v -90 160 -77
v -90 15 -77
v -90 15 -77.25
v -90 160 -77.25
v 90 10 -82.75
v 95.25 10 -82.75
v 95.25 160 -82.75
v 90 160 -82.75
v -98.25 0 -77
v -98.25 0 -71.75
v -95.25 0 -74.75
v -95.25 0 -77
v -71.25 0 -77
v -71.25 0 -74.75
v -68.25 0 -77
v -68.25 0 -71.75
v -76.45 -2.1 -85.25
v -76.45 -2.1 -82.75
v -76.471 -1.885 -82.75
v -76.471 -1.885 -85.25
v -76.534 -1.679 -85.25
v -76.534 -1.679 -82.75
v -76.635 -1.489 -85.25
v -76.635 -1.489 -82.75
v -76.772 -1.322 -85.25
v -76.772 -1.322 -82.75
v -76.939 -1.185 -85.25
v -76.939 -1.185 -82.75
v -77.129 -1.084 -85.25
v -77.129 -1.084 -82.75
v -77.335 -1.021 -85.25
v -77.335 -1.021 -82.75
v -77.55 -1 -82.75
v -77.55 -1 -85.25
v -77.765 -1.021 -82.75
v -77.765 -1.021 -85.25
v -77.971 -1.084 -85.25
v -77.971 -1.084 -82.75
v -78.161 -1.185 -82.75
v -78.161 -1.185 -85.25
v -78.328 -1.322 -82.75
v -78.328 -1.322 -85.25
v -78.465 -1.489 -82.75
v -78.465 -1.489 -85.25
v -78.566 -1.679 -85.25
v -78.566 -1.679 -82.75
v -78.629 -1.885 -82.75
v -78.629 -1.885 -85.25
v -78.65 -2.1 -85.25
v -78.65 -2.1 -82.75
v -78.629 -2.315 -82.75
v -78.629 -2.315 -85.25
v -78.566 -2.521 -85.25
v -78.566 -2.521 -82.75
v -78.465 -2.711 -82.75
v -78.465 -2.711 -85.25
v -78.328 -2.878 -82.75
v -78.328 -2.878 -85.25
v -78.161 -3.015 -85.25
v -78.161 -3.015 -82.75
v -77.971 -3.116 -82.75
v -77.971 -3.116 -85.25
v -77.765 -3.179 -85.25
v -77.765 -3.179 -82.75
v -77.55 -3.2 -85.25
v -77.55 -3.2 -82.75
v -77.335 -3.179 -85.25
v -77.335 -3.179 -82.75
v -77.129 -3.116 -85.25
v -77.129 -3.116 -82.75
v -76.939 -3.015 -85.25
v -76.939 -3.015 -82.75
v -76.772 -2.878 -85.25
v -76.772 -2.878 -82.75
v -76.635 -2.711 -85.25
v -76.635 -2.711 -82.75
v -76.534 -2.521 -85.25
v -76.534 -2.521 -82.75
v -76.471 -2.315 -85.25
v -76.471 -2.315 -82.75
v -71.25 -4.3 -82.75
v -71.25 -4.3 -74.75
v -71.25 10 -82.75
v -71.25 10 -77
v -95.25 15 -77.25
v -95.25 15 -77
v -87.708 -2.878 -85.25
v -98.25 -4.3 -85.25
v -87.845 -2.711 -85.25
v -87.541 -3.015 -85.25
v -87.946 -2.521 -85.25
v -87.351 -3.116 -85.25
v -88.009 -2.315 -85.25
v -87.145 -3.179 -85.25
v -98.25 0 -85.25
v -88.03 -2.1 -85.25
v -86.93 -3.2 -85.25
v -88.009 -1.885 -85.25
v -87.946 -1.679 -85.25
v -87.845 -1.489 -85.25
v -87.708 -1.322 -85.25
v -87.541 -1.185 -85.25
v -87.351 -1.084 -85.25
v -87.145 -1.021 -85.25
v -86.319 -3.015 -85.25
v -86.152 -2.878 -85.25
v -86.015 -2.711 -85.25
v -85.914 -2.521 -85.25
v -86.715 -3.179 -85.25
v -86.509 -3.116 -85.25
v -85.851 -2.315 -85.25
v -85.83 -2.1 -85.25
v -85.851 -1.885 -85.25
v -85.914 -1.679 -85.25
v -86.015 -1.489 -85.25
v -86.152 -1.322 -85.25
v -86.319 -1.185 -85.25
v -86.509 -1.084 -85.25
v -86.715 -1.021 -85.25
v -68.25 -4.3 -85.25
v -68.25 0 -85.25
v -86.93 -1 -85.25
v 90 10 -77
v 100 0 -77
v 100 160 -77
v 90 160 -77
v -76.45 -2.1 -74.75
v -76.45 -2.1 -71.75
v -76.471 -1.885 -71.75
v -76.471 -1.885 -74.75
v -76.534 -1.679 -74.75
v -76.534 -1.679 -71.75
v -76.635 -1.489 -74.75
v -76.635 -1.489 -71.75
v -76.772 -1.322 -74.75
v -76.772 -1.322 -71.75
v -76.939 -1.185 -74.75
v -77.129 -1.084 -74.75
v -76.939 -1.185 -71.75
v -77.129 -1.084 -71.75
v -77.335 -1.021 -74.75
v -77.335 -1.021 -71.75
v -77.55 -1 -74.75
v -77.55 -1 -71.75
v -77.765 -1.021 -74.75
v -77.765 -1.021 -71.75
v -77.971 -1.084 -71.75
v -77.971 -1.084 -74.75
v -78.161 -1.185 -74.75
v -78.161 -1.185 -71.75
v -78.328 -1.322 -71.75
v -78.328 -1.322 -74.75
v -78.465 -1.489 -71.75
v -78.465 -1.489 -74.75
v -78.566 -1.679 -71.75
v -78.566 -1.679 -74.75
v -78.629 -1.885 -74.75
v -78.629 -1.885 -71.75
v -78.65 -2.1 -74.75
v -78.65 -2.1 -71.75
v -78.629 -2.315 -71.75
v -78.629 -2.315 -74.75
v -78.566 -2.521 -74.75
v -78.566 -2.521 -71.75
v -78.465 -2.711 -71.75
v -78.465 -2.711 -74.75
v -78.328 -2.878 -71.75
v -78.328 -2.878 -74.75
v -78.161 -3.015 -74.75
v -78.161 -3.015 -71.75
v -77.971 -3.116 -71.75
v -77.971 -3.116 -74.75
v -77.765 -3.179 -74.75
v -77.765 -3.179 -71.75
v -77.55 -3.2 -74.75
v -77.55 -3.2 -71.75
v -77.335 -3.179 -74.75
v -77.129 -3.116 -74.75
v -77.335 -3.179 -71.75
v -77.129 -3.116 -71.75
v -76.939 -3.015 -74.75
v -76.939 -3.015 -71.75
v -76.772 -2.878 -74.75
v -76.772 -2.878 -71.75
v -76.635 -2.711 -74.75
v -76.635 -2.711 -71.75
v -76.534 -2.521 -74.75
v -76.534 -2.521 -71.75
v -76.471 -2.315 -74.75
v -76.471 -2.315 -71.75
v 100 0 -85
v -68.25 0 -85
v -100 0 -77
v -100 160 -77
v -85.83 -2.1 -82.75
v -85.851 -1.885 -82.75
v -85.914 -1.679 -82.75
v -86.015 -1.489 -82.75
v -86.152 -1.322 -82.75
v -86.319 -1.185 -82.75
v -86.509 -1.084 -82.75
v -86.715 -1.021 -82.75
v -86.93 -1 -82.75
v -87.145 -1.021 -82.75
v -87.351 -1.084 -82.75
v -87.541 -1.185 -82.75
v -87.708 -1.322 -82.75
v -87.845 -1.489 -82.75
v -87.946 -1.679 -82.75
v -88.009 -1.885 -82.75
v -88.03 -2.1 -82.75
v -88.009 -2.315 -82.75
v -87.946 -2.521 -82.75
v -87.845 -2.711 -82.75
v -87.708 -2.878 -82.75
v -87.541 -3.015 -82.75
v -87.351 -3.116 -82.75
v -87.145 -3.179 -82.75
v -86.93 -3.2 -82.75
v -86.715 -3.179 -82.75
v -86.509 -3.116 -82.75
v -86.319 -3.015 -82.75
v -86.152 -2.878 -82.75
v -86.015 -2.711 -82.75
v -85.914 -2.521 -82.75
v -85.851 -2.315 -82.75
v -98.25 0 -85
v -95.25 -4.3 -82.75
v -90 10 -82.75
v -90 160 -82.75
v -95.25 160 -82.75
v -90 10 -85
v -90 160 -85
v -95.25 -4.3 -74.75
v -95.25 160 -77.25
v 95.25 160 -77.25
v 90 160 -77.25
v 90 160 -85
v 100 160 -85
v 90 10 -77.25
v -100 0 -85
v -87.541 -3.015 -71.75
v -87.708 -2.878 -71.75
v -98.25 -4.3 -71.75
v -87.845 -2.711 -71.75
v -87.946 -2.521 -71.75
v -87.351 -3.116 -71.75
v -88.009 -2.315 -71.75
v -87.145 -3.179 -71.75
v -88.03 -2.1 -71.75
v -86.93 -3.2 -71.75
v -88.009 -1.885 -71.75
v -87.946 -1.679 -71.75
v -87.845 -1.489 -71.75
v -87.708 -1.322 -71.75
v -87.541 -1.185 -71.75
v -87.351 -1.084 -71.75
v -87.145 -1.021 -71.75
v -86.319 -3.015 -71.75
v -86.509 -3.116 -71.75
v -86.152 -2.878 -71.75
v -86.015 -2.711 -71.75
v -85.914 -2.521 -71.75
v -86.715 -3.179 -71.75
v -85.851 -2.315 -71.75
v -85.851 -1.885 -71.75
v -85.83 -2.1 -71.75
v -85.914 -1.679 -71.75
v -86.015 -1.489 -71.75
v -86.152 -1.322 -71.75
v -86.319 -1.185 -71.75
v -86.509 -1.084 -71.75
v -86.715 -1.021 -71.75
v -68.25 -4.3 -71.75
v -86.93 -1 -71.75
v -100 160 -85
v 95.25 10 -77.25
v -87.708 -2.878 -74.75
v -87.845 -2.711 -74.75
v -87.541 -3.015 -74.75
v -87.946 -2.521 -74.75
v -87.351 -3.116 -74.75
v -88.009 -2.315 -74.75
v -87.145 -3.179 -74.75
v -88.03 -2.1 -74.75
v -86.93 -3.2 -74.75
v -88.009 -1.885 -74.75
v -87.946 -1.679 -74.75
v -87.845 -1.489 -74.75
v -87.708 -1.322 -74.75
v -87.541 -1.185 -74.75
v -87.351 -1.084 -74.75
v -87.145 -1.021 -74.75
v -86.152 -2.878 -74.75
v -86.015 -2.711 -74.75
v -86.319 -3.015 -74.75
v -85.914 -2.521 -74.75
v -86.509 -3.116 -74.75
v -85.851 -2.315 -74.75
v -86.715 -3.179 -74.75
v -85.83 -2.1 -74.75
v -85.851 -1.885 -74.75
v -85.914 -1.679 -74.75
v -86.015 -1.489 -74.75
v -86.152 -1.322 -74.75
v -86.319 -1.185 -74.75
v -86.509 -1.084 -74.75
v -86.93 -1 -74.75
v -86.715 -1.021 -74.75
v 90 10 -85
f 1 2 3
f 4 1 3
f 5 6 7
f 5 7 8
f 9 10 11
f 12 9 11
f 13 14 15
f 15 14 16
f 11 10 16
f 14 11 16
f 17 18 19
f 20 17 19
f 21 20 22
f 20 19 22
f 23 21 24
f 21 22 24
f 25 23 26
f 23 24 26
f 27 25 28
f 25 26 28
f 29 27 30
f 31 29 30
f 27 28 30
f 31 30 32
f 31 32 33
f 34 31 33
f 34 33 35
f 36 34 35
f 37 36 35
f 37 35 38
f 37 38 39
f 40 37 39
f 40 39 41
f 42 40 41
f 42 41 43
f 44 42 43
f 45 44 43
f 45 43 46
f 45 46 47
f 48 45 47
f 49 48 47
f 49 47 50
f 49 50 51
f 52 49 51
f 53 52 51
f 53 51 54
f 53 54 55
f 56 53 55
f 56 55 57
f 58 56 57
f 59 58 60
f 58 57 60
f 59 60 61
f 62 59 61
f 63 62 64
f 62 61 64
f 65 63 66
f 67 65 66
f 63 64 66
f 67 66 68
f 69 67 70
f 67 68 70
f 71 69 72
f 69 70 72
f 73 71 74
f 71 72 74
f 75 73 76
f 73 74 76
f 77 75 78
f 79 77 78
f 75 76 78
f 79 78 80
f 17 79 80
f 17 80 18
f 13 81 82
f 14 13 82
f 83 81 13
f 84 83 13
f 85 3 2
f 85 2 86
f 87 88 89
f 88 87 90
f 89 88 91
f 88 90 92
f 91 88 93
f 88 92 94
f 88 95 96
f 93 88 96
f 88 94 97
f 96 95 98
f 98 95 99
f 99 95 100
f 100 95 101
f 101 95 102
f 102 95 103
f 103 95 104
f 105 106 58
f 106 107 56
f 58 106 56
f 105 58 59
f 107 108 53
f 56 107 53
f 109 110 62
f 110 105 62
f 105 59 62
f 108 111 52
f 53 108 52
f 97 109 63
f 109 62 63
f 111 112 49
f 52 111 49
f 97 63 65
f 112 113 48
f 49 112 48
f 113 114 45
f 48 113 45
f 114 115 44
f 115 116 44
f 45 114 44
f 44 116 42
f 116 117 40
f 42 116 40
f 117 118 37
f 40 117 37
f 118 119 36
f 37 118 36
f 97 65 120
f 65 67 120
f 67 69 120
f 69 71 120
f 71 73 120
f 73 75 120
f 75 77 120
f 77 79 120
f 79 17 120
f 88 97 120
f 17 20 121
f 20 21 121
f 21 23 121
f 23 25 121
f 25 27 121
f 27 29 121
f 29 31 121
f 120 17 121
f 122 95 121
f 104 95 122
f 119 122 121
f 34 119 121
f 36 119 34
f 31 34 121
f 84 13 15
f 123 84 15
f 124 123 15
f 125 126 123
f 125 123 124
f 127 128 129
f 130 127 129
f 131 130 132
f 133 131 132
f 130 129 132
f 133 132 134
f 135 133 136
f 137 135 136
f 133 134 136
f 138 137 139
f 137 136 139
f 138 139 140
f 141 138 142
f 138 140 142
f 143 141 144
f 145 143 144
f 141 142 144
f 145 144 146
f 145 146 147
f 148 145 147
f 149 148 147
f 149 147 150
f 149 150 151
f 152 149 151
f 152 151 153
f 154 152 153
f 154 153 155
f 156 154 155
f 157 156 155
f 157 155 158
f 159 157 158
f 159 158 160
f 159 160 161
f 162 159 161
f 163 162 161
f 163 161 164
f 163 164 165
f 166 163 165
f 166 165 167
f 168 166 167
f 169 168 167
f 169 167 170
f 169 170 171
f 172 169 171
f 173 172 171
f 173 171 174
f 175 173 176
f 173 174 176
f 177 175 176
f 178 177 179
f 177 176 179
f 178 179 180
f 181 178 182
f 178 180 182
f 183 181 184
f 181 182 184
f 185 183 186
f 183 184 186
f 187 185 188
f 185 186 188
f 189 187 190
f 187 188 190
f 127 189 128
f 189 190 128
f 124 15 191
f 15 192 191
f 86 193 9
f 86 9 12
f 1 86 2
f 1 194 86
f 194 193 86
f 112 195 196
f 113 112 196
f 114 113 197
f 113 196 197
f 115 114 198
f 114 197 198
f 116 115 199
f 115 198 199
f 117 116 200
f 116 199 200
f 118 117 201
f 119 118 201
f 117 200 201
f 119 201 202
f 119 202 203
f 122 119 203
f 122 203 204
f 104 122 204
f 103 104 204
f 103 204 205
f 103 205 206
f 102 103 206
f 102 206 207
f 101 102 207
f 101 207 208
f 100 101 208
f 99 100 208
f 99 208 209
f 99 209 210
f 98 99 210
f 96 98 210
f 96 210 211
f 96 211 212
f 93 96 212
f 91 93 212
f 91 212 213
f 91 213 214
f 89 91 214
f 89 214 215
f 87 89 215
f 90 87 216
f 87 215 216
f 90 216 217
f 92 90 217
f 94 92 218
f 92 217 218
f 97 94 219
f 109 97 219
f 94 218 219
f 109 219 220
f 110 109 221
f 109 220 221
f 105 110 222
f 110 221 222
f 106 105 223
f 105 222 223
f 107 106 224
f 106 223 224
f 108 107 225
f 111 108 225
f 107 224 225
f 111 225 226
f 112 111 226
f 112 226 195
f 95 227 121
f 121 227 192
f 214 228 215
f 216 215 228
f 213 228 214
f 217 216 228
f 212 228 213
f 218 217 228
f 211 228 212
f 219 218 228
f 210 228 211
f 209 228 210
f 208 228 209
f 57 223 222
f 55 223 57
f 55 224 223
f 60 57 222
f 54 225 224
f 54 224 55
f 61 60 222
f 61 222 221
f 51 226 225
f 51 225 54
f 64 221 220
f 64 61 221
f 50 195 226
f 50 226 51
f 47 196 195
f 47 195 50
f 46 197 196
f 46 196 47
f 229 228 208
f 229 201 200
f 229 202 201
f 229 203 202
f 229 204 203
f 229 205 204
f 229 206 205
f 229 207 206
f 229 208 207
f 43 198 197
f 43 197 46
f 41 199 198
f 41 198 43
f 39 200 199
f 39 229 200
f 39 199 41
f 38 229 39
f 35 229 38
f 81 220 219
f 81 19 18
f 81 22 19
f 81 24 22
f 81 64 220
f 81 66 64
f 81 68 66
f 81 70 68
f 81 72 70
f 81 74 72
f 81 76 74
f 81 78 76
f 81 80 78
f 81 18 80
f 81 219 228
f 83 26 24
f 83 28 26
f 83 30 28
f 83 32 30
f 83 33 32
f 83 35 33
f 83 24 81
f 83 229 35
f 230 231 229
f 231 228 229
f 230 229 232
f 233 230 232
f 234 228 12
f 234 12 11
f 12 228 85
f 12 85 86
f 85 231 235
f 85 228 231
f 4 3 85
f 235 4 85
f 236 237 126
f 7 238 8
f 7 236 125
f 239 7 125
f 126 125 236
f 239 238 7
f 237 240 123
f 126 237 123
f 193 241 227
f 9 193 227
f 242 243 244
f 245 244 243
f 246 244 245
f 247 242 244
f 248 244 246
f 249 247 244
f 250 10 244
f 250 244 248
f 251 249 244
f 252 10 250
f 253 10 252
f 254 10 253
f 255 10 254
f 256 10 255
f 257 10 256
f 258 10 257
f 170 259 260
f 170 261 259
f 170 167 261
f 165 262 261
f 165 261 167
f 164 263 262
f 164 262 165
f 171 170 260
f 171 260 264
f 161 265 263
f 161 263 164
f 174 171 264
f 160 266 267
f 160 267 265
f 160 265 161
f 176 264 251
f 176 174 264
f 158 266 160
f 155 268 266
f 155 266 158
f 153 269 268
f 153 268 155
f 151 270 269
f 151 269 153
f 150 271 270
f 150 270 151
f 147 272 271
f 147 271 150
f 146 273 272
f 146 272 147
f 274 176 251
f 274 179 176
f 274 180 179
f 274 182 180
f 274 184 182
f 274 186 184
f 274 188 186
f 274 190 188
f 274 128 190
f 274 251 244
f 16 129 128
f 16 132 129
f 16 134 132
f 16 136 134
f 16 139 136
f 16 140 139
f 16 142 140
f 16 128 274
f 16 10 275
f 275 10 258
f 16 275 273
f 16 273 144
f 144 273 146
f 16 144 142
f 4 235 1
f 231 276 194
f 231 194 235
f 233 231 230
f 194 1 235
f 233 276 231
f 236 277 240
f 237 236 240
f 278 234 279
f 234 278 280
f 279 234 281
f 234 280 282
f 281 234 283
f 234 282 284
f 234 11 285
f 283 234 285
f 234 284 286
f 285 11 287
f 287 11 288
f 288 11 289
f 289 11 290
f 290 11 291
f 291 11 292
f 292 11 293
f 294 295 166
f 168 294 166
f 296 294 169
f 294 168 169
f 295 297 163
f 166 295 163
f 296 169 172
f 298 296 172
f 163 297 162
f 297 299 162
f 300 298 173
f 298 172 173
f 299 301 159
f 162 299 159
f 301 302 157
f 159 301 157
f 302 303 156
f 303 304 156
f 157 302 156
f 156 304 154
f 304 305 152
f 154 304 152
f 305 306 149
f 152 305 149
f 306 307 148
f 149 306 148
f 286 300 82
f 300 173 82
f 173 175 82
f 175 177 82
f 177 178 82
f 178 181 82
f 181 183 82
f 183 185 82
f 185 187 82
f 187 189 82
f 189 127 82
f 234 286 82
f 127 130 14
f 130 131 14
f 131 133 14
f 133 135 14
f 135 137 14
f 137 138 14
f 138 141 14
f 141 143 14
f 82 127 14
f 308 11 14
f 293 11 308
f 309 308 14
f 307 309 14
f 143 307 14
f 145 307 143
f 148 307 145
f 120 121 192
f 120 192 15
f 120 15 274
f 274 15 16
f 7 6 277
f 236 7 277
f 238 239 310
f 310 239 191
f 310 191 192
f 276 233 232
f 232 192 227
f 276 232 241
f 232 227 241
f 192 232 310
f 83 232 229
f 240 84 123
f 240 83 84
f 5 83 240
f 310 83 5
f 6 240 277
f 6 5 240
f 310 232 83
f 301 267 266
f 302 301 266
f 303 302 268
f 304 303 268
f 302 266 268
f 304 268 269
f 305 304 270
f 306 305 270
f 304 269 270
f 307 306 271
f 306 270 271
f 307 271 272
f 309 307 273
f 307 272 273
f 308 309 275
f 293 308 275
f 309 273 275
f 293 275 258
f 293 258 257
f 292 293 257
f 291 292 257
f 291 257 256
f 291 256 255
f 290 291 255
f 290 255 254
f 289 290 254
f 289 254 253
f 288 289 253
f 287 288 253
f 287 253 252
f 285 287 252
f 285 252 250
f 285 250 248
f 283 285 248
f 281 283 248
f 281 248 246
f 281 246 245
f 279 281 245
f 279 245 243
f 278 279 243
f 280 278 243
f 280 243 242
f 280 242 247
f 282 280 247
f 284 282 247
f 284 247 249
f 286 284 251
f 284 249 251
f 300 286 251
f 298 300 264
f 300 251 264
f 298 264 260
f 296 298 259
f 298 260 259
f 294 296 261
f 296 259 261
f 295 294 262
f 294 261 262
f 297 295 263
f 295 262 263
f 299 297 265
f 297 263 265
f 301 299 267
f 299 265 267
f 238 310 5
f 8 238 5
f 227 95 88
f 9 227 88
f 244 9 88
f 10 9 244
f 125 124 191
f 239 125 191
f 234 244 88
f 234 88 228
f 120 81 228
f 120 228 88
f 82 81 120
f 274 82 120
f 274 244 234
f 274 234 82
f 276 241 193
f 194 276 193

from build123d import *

# Parameters (mm, degrees)
CROQUIS1_W              = 200
CROQUIS1_H              = 170
SALIENTE_EXTRUIR1_DEPTH = 10
SALIENTE_EXTRUIR2_DEPTH = 150
CROQUIS3_W              = 90
CROQUIS3_H              = 10
SALIENTE_EXTRUIR3_DEPTH = 100
CROQUIS4_W              = 5.25
CROQUIS4_H              = 5.5
CORTAR_EXTRUIR1_DEPTH   = 170
CROQUIS7_W              = 90
CROQUIS7_H              = 10
SALIENTE_EXTRUIR4_DEPTH = 5
CORTAR_EXTRUIR3_DEPTH   = 10
CORTAR_EXTRUIR4_DEPTH   = 30
CORTAR_EXTRUIR5_DEPTH   = 5
CROQUIS10_W             = 30
CROQUIS10_H             = 13.5
CROQUIS10_W_2           = 24
CROQUIS10_H_2           = 8
SALIENTE_EXTRUIR5_DEPTH = 4.3
CROQUIS11_R             = 1.1
CORTAR_EXTRUIR6_DEPTH   = 14.3
CROQUIS12_R             = 1.75
CORTAR_EXTRUIR7_DEPTH   = 6.4
CROQUIS13_R             = 1.7
CORTAR_EXTRUIR8_DEPTH   = 5
CROQUIS14_W             = 0.3
CROQUIS14_H             = 10
CORTAR_EXTRUIR9_DEPTH   = 5
SALIENTE_EXTRUIR6_DEPTH = 5
CROQUIS16_W             = 200
CROQUIS16_H             = 160
CORTAR_EXTRUIR10_DEPTH  = 162
CROQUIS16_2_W           = 200
CROQUIS16_2_H           = 160
CORTAR_EXTRUIR11_DEPTH  = 162


with BuildPart() as part:
    # Croquis1 → Saliente-Extruir1 (new body)
    with BuildSketch(Plane(origin=(0, 0, 0), x_dir=(1, 0, 0), z_dir=(0, 1, 0))):
        Rectangle(CROQUIS1_W, CROQUIS1_H)
    extrude(amount=SALIENTE_EXTRUIR1_DEPTH)

    # Croquis2 → Saliente-Extruir2 (add)
    with BuildSketch(Plane(origin=(0, 10, 0), x_dir=(1, 0, 0), z_dir=(0, 1, 0))):
        Polygon((-100, 85), (-100, -85), (-30.21, -85), (-30.21, -75), (-90, -75), (-90, 85), align=None)
        Polygon((59.79, -75), (59.79, -85), (100, -85), (100, 85), (90, 85), (90, -75), align=None)
    extrude(amount=SALIENTE_EXTRUIR2_DEPTH)

    # Croquis3 → Saliente-Extruir3 (add)
    with BuildSketch(Plane(origin=(0, 160, 0), x_dir=(1, 0, 0), z_dir=(0, 1, 0))):
        with Locations((14.79, -80)):
            Rectangle(CROQUIS3_W, CROQUIS3_H)
    extrude(amount=-SALIENTE_EXTRUIR3_DEPTH)

    # Croquis4 → Cortar-Extruir1 (cut)
    with BuildSketch(Plane(origin=(0, 10, 65), x_dir=(-1, 0, 0), z_dir=(0, 1, 0))):
        with Locations((92.625, -145)):
            Rectangle(CROQUIS4_W, CROQUIS4_H)
        with Locations((-92.625, -145)):
            Rectangle(CROQUIS4_W, CROQUIS4_H)
    extrude(amount=CORTAR_EXTRUIR1_DEPTH, mode=Mode.SUBTRACT)

    # Croquis7 → Saliente-Extruir4 (add)
    with BuildSketch(Plane.XY.offset(85)):
        with Locations((14.79, 65)):
            Rectangle(CROQUIS7_W, CROQUIS7_H)
    extrude(amount=SALIENTE_EXTRUIR4_DEPTH)

    # Croquis8 → Cortar-Extruir3 (cut)
    with BuildSketch(Plane(origin=(0, 160, 0), x_dir=(1, 0, 0), z_dir=(0, 1, 0))):
        Polygon((98, -83), (98, 70), (92, 70), (92, -77), (-92, -77), (-92, 70), (-98, 70), (-98, -83), align=None)
    extrude(amount=-CORTAR_EXTRUIR3_DEPTH, mode=Mode.SUBTRACT)

    # Croquis9 → Cortar-Extruir4 (cut)
    with BuildSketch(Plane(origin=(0, 10, 0), x_dir=(1, 0, 0), z_dir=(0, 1, 0))):
        Polygon((-95.25, 77.25), (-95.25, 82.75), (-71.25, 82.75), (-71.25, 77.25), (-71.25, 74.75), (-95.25, 74.75), align=None)
    extrude(amount=-CORTAR_EXTRUIR4_DEPTH, mode=Mode.SUBTRACT)

    # Croquis9<2> → Cortar-Extruir5 (cut)
    with BuildSketch(Plane(origin=(0, 10, 0), x_dir=(1, 0, 0), z_dir=(0, 1, 0))):
        Polygon((-95.25, 77.25), (-95.25, 82.75), (-71.25, 82.75), (-71.25, 77.25), (-71.25, 74.75), (-95.25, 74.75), align=None)
    extrude(amount=CORTAR_EXTRUIR5_DEPTH, mode=Mode.SUBTRACT)

    # Croquis10 → Saliente-Extruir5 (add)
    with BuildSketch(Plane.XZ):
        with Locations((-83.25, -78.5)):
            Rectangle(CROQUIS10_W, CROQUIS10_H)
        with Locations((-83.25, -78.75)):
            Rectangle(CROQUIS10_W_2, CROQUIS10_H_2, mode=Mode.SUBTRACT)
    extrude(amount=SALIENTE_EXTRUIR5_DEPTH)

    # Croquis11 → Cortar-Extruir6 (cut)
    with BuildSketch(Plane.XY.offset(-71.75)):
        with Locations((-77.55, -2.1)):
            Circle(CROQUIS11_R)
        with Locations((-86.93, -2.1)):
            Circle(CROQUIS11_R)
    extrude(amount=-CORTAR_EXTRUIR6_DEPTH, mode=Mode.SUBTRACT)

    # Croquis12 → Cortar-Extruir7 (cut)
    with BuildSketch(Plane.XZ):
        with Locations((-91.5, -55)):
            Circle(CROQUIS12_R)
        with Locations((18.5, -55)):
            Circle(CROQUIS12_R)
        with Locations((-91.5, 55)):
            Circle(CROQUIS12_R)
        with Locations((18.5, 55)):
            Circle(CROQUIS12_R)
    extrude(amount=-CORTAR_EXTRUIR7_DEPTH, mode=Mode.SUBTRACT)

    # Croquis13 → Cortar-Extruir8 (cut)
    with BuildSketch(Plane.XY.offset(85)):
        with Locations((-50.21, 24)):
            Circle(CROQUIS13_R)
        with Locations((79.79, 24)):
            Circle(CROQUIS13_R)
    extrude(amount=-CORTAR_EXTRUIR8_DEPTH, mode=Mode.SUBTRACT)

    # Croquis14 → Cortar-Extruir9 (cut)
    with BuildSketch(Plane.XY.offset(90)):
        with Locations((-30.06, 65)):
            Rectangle(CROQUIS14_W, CROQUIS14_H)
        with Locations((59.64, 65)):
            Rectangle(CROQUIS14_W, CROQUIS14_H)
    extrude(amount=-CORTAR_EXTRUIR9_DEPTH, mode=Mode.SUBTRACT)

    # Croquis15 → Saliente-Extruir6 (add)
    with BuildSketch(Plane.XY.offset(85)):
        Polygon((14.79, 0), (94.79, 0), (94.79, 4.8), (14.79, 4.8), (-65.21, 4.8), (-65.21, 0), align=None)
    extrude(amount=SALIENTE_EXTRUIR6_DEPTH)

    # Croquis16 → Cortar-Extruir10 (cut)
    with BuildSketch(Plane.XY.offset(85)):
        with Locations((0, 80)):
            Rectangle(CROQUIS16_W, CROQUIS16_H)
    extrude(amount=-CORTAR_EXTRUIR10_DEPTH, mode=Mode.SUBTRACT)


with BuildPart() as cortar_extruir10_piece_1:
    # of the separate pieces the step leaves, piece 1, a body of its own (cortar_extruir10_pieces)
    add(part.part.solids().sort_by_distance((-100, 160, -85))[0])


with BuildPart() as cortar_extruir10_piece_2:
    # of the separate pieces the step leaves, piece 2, a body of its own (cortar_extruir10_pieces)
    add(part.part.solids().sort_by_distance((-29.91, 60, 90))[0])


with BuildPart() as cortar_extruir10_piece_3:
    # of the separate pieces the step leaves, piece 3, a body of its own (cortar_extruir10_pieces)
    add(part.part.solids().sort_by_distance((-65.21, 4.8, 85))[0])


with BuildPart() as cortar_extruir11_tool:
    # Croquis16<2> → Cortar-Extruir11 (new body)
    with BuildSketch(Plane.XY.offset(85)):
        with Locations((0, 80)):
            Rectangle(CROQUIS16_2_W, CROQUIS16_2_H)
    extrude(amount=CORTAR_EXTRUIR11_DEPTH)


with BuildPart() as cortar_extruir10_piece_2_1:
    add(cortar_extruir10_piece_2.part)

    # Cortar-Extruir11: cut by cortar_extruir11_tool
    add(cortar_extruir11_tool.part, mode=Mode.SUBTRACT)


with BuildPart() as cortar_extruir10_piece_3_1:
    add(cortar_extruir10_piece_3.part)

    # Cortar-Extruir11: cut by cortar_extruir11_tool
    add(cortar_extruir11_tool.part, mode=Mode.SUBTRACT)


solid = cortar_extruir10_piece_1.part
